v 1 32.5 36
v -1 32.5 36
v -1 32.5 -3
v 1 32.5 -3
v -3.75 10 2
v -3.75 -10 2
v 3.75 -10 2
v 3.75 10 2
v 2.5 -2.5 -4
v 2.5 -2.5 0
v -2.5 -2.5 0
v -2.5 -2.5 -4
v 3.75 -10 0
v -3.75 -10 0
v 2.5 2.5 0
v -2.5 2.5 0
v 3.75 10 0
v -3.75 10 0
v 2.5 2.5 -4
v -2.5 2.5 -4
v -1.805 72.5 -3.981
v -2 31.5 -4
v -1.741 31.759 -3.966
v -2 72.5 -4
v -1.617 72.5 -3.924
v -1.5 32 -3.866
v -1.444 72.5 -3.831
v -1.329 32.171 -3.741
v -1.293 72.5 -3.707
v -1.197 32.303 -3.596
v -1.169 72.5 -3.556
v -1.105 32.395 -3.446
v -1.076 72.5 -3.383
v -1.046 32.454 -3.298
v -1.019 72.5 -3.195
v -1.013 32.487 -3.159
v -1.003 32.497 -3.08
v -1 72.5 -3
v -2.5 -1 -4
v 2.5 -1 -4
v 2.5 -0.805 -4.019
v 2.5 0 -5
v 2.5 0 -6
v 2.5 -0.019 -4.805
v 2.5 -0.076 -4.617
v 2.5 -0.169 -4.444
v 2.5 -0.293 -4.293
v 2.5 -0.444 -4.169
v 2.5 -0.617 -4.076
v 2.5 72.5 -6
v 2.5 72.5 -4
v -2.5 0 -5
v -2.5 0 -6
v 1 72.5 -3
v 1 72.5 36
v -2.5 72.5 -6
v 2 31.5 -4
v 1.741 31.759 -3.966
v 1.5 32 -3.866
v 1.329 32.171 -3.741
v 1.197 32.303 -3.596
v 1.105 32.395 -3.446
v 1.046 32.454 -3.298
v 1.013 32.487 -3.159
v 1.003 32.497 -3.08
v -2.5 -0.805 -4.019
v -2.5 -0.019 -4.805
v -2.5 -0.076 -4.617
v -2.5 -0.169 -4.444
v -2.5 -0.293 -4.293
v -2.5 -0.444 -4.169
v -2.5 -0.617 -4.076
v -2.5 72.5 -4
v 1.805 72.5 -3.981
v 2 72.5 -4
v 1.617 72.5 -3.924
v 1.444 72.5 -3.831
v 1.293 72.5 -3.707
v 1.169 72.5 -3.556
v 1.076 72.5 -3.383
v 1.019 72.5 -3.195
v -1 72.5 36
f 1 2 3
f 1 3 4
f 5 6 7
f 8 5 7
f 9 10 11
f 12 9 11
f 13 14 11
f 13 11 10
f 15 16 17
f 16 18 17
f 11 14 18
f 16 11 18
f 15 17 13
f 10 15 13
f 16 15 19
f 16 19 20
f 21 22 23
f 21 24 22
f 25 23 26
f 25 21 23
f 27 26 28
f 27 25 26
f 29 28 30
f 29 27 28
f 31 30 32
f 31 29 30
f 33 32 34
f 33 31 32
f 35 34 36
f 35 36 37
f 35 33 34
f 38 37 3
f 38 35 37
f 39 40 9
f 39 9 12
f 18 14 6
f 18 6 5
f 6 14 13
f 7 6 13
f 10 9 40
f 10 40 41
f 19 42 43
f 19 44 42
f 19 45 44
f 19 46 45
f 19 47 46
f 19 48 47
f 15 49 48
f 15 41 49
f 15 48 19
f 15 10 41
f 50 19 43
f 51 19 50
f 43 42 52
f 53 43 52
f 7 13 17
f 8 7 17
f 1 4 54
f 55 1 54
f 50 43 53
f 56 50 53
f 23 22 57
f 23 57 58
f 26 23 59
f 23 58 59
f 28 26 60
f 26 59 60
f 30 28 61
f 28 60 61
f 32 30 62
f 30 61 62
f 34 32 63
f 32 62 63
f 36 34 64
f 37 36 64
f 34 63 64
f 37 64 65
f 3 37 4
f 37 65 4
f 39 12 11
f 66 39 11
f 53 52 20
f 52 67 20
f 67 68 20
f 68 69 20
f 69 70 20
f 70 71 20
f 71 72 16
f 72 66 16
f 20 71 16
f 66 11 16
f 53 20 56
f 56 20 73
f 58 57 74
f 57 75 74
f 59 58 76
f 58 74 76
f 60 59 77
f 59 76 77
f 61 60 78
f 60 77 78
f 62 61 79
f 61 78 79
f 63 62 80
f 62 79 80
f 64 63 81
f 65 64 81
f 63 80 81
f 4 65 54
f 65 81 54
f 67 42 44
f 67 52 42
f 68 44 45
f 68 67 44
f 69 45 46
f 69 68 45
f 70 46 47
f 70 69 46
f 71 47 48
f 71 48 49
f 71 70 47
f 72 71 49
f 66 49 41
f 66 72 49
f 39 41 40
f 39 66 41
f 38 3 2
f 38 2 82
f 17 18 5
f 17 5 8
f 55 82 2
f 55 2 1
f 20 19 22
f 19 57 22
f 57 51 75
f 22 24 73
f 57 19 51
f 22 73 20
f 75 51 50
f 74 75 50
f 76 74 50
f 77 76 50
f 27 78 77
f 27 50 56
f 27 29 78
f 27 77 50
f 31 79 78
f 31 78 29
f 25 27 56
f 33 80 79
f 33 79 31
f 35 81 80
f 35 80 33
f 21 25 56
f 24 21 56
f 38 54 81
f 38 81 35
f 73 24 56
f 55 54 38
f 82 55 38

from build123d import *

# Parameters (mm, degrees)
SKETCH1_W           = 7.5
SKETCH1_H           = 20
BOSS_EXTRUDE1_DEPTH = 2
SKETCH2_W           = 5
SKETCH2_H           = 5
BOSS_EXTRUDE2_DEPTH = 4
SKETCH3_W           = 5
SKETCH3_H           = 72.5
BOSS_EXTRUDE3_DEPTH = 2
SKETCH4_W           = 2
SKETCH4_H           = 40
BOSS_EXTRUDE4_DEPTH = 40
FILLET1_R           = 1
FILLET2_R           = 1


with BuildPart() as part:
    # Sketch1 → Boss-Extrude1 (new body)
    with BuildSketch(Plane.XY):
        Rectangle(SKETCH1_W, SKETCH1_H)
    extrude(amount=BOSS_EXTRUDE1_DEPTH)

    # Sketch2 → Boss-Extrude2 (add)
    with BuildSketch(Plane(origin=(0, 0, 0), x_dir=(-1, 0, 0), z_dir=(0, 0, -1))):
        Rectangle(SKETCH2_W, SKETCH2_H)
    extrude(amount=BOSS_EXTRUDE2_DEPTH)

    # Sketch3 → Boss-Extrude3 (add)
    with BuildSketch(Plane(origin=(0, 0, -4), x_dir=(-1, 0, 0), z_dir=(0, 0, -1))):
        with Locations((0, 36.25)):
            Rectangle(SKETCH3_W, SKETCH3_H)
    extrude(amount=BOSS_EXTRUDE3_DEPTH)

    # Sketch4 → Boss-Extrude4 (add)
    with BuildSketch(Plane.XY.offset(-4)):
        with Locations((0, 52.5)):
            Rectangle(SKETCH4_W, SKETCH4_H)
    extrude(amount=BOSS_EXTRUDE4_DEPTH)

    # Fillet1
    fillet1_edges = [part.edges().sort_by_distance(p)[0] for p in [
        (0, 0, -4),
    ]]
    fillet(fillet1_edges, radius=FILLET1_R)

    # Fillet2
    fillet2_edges = [part.edges().sort_by_distance(p)[0] for p in [
        (-1, 52.5, -4),
        (0, 32.5, -4),
        (1, 52.5, -4),
    ]]
    fillet(fillet2_edges, radius=FILLET2_R)


solid = part.part
